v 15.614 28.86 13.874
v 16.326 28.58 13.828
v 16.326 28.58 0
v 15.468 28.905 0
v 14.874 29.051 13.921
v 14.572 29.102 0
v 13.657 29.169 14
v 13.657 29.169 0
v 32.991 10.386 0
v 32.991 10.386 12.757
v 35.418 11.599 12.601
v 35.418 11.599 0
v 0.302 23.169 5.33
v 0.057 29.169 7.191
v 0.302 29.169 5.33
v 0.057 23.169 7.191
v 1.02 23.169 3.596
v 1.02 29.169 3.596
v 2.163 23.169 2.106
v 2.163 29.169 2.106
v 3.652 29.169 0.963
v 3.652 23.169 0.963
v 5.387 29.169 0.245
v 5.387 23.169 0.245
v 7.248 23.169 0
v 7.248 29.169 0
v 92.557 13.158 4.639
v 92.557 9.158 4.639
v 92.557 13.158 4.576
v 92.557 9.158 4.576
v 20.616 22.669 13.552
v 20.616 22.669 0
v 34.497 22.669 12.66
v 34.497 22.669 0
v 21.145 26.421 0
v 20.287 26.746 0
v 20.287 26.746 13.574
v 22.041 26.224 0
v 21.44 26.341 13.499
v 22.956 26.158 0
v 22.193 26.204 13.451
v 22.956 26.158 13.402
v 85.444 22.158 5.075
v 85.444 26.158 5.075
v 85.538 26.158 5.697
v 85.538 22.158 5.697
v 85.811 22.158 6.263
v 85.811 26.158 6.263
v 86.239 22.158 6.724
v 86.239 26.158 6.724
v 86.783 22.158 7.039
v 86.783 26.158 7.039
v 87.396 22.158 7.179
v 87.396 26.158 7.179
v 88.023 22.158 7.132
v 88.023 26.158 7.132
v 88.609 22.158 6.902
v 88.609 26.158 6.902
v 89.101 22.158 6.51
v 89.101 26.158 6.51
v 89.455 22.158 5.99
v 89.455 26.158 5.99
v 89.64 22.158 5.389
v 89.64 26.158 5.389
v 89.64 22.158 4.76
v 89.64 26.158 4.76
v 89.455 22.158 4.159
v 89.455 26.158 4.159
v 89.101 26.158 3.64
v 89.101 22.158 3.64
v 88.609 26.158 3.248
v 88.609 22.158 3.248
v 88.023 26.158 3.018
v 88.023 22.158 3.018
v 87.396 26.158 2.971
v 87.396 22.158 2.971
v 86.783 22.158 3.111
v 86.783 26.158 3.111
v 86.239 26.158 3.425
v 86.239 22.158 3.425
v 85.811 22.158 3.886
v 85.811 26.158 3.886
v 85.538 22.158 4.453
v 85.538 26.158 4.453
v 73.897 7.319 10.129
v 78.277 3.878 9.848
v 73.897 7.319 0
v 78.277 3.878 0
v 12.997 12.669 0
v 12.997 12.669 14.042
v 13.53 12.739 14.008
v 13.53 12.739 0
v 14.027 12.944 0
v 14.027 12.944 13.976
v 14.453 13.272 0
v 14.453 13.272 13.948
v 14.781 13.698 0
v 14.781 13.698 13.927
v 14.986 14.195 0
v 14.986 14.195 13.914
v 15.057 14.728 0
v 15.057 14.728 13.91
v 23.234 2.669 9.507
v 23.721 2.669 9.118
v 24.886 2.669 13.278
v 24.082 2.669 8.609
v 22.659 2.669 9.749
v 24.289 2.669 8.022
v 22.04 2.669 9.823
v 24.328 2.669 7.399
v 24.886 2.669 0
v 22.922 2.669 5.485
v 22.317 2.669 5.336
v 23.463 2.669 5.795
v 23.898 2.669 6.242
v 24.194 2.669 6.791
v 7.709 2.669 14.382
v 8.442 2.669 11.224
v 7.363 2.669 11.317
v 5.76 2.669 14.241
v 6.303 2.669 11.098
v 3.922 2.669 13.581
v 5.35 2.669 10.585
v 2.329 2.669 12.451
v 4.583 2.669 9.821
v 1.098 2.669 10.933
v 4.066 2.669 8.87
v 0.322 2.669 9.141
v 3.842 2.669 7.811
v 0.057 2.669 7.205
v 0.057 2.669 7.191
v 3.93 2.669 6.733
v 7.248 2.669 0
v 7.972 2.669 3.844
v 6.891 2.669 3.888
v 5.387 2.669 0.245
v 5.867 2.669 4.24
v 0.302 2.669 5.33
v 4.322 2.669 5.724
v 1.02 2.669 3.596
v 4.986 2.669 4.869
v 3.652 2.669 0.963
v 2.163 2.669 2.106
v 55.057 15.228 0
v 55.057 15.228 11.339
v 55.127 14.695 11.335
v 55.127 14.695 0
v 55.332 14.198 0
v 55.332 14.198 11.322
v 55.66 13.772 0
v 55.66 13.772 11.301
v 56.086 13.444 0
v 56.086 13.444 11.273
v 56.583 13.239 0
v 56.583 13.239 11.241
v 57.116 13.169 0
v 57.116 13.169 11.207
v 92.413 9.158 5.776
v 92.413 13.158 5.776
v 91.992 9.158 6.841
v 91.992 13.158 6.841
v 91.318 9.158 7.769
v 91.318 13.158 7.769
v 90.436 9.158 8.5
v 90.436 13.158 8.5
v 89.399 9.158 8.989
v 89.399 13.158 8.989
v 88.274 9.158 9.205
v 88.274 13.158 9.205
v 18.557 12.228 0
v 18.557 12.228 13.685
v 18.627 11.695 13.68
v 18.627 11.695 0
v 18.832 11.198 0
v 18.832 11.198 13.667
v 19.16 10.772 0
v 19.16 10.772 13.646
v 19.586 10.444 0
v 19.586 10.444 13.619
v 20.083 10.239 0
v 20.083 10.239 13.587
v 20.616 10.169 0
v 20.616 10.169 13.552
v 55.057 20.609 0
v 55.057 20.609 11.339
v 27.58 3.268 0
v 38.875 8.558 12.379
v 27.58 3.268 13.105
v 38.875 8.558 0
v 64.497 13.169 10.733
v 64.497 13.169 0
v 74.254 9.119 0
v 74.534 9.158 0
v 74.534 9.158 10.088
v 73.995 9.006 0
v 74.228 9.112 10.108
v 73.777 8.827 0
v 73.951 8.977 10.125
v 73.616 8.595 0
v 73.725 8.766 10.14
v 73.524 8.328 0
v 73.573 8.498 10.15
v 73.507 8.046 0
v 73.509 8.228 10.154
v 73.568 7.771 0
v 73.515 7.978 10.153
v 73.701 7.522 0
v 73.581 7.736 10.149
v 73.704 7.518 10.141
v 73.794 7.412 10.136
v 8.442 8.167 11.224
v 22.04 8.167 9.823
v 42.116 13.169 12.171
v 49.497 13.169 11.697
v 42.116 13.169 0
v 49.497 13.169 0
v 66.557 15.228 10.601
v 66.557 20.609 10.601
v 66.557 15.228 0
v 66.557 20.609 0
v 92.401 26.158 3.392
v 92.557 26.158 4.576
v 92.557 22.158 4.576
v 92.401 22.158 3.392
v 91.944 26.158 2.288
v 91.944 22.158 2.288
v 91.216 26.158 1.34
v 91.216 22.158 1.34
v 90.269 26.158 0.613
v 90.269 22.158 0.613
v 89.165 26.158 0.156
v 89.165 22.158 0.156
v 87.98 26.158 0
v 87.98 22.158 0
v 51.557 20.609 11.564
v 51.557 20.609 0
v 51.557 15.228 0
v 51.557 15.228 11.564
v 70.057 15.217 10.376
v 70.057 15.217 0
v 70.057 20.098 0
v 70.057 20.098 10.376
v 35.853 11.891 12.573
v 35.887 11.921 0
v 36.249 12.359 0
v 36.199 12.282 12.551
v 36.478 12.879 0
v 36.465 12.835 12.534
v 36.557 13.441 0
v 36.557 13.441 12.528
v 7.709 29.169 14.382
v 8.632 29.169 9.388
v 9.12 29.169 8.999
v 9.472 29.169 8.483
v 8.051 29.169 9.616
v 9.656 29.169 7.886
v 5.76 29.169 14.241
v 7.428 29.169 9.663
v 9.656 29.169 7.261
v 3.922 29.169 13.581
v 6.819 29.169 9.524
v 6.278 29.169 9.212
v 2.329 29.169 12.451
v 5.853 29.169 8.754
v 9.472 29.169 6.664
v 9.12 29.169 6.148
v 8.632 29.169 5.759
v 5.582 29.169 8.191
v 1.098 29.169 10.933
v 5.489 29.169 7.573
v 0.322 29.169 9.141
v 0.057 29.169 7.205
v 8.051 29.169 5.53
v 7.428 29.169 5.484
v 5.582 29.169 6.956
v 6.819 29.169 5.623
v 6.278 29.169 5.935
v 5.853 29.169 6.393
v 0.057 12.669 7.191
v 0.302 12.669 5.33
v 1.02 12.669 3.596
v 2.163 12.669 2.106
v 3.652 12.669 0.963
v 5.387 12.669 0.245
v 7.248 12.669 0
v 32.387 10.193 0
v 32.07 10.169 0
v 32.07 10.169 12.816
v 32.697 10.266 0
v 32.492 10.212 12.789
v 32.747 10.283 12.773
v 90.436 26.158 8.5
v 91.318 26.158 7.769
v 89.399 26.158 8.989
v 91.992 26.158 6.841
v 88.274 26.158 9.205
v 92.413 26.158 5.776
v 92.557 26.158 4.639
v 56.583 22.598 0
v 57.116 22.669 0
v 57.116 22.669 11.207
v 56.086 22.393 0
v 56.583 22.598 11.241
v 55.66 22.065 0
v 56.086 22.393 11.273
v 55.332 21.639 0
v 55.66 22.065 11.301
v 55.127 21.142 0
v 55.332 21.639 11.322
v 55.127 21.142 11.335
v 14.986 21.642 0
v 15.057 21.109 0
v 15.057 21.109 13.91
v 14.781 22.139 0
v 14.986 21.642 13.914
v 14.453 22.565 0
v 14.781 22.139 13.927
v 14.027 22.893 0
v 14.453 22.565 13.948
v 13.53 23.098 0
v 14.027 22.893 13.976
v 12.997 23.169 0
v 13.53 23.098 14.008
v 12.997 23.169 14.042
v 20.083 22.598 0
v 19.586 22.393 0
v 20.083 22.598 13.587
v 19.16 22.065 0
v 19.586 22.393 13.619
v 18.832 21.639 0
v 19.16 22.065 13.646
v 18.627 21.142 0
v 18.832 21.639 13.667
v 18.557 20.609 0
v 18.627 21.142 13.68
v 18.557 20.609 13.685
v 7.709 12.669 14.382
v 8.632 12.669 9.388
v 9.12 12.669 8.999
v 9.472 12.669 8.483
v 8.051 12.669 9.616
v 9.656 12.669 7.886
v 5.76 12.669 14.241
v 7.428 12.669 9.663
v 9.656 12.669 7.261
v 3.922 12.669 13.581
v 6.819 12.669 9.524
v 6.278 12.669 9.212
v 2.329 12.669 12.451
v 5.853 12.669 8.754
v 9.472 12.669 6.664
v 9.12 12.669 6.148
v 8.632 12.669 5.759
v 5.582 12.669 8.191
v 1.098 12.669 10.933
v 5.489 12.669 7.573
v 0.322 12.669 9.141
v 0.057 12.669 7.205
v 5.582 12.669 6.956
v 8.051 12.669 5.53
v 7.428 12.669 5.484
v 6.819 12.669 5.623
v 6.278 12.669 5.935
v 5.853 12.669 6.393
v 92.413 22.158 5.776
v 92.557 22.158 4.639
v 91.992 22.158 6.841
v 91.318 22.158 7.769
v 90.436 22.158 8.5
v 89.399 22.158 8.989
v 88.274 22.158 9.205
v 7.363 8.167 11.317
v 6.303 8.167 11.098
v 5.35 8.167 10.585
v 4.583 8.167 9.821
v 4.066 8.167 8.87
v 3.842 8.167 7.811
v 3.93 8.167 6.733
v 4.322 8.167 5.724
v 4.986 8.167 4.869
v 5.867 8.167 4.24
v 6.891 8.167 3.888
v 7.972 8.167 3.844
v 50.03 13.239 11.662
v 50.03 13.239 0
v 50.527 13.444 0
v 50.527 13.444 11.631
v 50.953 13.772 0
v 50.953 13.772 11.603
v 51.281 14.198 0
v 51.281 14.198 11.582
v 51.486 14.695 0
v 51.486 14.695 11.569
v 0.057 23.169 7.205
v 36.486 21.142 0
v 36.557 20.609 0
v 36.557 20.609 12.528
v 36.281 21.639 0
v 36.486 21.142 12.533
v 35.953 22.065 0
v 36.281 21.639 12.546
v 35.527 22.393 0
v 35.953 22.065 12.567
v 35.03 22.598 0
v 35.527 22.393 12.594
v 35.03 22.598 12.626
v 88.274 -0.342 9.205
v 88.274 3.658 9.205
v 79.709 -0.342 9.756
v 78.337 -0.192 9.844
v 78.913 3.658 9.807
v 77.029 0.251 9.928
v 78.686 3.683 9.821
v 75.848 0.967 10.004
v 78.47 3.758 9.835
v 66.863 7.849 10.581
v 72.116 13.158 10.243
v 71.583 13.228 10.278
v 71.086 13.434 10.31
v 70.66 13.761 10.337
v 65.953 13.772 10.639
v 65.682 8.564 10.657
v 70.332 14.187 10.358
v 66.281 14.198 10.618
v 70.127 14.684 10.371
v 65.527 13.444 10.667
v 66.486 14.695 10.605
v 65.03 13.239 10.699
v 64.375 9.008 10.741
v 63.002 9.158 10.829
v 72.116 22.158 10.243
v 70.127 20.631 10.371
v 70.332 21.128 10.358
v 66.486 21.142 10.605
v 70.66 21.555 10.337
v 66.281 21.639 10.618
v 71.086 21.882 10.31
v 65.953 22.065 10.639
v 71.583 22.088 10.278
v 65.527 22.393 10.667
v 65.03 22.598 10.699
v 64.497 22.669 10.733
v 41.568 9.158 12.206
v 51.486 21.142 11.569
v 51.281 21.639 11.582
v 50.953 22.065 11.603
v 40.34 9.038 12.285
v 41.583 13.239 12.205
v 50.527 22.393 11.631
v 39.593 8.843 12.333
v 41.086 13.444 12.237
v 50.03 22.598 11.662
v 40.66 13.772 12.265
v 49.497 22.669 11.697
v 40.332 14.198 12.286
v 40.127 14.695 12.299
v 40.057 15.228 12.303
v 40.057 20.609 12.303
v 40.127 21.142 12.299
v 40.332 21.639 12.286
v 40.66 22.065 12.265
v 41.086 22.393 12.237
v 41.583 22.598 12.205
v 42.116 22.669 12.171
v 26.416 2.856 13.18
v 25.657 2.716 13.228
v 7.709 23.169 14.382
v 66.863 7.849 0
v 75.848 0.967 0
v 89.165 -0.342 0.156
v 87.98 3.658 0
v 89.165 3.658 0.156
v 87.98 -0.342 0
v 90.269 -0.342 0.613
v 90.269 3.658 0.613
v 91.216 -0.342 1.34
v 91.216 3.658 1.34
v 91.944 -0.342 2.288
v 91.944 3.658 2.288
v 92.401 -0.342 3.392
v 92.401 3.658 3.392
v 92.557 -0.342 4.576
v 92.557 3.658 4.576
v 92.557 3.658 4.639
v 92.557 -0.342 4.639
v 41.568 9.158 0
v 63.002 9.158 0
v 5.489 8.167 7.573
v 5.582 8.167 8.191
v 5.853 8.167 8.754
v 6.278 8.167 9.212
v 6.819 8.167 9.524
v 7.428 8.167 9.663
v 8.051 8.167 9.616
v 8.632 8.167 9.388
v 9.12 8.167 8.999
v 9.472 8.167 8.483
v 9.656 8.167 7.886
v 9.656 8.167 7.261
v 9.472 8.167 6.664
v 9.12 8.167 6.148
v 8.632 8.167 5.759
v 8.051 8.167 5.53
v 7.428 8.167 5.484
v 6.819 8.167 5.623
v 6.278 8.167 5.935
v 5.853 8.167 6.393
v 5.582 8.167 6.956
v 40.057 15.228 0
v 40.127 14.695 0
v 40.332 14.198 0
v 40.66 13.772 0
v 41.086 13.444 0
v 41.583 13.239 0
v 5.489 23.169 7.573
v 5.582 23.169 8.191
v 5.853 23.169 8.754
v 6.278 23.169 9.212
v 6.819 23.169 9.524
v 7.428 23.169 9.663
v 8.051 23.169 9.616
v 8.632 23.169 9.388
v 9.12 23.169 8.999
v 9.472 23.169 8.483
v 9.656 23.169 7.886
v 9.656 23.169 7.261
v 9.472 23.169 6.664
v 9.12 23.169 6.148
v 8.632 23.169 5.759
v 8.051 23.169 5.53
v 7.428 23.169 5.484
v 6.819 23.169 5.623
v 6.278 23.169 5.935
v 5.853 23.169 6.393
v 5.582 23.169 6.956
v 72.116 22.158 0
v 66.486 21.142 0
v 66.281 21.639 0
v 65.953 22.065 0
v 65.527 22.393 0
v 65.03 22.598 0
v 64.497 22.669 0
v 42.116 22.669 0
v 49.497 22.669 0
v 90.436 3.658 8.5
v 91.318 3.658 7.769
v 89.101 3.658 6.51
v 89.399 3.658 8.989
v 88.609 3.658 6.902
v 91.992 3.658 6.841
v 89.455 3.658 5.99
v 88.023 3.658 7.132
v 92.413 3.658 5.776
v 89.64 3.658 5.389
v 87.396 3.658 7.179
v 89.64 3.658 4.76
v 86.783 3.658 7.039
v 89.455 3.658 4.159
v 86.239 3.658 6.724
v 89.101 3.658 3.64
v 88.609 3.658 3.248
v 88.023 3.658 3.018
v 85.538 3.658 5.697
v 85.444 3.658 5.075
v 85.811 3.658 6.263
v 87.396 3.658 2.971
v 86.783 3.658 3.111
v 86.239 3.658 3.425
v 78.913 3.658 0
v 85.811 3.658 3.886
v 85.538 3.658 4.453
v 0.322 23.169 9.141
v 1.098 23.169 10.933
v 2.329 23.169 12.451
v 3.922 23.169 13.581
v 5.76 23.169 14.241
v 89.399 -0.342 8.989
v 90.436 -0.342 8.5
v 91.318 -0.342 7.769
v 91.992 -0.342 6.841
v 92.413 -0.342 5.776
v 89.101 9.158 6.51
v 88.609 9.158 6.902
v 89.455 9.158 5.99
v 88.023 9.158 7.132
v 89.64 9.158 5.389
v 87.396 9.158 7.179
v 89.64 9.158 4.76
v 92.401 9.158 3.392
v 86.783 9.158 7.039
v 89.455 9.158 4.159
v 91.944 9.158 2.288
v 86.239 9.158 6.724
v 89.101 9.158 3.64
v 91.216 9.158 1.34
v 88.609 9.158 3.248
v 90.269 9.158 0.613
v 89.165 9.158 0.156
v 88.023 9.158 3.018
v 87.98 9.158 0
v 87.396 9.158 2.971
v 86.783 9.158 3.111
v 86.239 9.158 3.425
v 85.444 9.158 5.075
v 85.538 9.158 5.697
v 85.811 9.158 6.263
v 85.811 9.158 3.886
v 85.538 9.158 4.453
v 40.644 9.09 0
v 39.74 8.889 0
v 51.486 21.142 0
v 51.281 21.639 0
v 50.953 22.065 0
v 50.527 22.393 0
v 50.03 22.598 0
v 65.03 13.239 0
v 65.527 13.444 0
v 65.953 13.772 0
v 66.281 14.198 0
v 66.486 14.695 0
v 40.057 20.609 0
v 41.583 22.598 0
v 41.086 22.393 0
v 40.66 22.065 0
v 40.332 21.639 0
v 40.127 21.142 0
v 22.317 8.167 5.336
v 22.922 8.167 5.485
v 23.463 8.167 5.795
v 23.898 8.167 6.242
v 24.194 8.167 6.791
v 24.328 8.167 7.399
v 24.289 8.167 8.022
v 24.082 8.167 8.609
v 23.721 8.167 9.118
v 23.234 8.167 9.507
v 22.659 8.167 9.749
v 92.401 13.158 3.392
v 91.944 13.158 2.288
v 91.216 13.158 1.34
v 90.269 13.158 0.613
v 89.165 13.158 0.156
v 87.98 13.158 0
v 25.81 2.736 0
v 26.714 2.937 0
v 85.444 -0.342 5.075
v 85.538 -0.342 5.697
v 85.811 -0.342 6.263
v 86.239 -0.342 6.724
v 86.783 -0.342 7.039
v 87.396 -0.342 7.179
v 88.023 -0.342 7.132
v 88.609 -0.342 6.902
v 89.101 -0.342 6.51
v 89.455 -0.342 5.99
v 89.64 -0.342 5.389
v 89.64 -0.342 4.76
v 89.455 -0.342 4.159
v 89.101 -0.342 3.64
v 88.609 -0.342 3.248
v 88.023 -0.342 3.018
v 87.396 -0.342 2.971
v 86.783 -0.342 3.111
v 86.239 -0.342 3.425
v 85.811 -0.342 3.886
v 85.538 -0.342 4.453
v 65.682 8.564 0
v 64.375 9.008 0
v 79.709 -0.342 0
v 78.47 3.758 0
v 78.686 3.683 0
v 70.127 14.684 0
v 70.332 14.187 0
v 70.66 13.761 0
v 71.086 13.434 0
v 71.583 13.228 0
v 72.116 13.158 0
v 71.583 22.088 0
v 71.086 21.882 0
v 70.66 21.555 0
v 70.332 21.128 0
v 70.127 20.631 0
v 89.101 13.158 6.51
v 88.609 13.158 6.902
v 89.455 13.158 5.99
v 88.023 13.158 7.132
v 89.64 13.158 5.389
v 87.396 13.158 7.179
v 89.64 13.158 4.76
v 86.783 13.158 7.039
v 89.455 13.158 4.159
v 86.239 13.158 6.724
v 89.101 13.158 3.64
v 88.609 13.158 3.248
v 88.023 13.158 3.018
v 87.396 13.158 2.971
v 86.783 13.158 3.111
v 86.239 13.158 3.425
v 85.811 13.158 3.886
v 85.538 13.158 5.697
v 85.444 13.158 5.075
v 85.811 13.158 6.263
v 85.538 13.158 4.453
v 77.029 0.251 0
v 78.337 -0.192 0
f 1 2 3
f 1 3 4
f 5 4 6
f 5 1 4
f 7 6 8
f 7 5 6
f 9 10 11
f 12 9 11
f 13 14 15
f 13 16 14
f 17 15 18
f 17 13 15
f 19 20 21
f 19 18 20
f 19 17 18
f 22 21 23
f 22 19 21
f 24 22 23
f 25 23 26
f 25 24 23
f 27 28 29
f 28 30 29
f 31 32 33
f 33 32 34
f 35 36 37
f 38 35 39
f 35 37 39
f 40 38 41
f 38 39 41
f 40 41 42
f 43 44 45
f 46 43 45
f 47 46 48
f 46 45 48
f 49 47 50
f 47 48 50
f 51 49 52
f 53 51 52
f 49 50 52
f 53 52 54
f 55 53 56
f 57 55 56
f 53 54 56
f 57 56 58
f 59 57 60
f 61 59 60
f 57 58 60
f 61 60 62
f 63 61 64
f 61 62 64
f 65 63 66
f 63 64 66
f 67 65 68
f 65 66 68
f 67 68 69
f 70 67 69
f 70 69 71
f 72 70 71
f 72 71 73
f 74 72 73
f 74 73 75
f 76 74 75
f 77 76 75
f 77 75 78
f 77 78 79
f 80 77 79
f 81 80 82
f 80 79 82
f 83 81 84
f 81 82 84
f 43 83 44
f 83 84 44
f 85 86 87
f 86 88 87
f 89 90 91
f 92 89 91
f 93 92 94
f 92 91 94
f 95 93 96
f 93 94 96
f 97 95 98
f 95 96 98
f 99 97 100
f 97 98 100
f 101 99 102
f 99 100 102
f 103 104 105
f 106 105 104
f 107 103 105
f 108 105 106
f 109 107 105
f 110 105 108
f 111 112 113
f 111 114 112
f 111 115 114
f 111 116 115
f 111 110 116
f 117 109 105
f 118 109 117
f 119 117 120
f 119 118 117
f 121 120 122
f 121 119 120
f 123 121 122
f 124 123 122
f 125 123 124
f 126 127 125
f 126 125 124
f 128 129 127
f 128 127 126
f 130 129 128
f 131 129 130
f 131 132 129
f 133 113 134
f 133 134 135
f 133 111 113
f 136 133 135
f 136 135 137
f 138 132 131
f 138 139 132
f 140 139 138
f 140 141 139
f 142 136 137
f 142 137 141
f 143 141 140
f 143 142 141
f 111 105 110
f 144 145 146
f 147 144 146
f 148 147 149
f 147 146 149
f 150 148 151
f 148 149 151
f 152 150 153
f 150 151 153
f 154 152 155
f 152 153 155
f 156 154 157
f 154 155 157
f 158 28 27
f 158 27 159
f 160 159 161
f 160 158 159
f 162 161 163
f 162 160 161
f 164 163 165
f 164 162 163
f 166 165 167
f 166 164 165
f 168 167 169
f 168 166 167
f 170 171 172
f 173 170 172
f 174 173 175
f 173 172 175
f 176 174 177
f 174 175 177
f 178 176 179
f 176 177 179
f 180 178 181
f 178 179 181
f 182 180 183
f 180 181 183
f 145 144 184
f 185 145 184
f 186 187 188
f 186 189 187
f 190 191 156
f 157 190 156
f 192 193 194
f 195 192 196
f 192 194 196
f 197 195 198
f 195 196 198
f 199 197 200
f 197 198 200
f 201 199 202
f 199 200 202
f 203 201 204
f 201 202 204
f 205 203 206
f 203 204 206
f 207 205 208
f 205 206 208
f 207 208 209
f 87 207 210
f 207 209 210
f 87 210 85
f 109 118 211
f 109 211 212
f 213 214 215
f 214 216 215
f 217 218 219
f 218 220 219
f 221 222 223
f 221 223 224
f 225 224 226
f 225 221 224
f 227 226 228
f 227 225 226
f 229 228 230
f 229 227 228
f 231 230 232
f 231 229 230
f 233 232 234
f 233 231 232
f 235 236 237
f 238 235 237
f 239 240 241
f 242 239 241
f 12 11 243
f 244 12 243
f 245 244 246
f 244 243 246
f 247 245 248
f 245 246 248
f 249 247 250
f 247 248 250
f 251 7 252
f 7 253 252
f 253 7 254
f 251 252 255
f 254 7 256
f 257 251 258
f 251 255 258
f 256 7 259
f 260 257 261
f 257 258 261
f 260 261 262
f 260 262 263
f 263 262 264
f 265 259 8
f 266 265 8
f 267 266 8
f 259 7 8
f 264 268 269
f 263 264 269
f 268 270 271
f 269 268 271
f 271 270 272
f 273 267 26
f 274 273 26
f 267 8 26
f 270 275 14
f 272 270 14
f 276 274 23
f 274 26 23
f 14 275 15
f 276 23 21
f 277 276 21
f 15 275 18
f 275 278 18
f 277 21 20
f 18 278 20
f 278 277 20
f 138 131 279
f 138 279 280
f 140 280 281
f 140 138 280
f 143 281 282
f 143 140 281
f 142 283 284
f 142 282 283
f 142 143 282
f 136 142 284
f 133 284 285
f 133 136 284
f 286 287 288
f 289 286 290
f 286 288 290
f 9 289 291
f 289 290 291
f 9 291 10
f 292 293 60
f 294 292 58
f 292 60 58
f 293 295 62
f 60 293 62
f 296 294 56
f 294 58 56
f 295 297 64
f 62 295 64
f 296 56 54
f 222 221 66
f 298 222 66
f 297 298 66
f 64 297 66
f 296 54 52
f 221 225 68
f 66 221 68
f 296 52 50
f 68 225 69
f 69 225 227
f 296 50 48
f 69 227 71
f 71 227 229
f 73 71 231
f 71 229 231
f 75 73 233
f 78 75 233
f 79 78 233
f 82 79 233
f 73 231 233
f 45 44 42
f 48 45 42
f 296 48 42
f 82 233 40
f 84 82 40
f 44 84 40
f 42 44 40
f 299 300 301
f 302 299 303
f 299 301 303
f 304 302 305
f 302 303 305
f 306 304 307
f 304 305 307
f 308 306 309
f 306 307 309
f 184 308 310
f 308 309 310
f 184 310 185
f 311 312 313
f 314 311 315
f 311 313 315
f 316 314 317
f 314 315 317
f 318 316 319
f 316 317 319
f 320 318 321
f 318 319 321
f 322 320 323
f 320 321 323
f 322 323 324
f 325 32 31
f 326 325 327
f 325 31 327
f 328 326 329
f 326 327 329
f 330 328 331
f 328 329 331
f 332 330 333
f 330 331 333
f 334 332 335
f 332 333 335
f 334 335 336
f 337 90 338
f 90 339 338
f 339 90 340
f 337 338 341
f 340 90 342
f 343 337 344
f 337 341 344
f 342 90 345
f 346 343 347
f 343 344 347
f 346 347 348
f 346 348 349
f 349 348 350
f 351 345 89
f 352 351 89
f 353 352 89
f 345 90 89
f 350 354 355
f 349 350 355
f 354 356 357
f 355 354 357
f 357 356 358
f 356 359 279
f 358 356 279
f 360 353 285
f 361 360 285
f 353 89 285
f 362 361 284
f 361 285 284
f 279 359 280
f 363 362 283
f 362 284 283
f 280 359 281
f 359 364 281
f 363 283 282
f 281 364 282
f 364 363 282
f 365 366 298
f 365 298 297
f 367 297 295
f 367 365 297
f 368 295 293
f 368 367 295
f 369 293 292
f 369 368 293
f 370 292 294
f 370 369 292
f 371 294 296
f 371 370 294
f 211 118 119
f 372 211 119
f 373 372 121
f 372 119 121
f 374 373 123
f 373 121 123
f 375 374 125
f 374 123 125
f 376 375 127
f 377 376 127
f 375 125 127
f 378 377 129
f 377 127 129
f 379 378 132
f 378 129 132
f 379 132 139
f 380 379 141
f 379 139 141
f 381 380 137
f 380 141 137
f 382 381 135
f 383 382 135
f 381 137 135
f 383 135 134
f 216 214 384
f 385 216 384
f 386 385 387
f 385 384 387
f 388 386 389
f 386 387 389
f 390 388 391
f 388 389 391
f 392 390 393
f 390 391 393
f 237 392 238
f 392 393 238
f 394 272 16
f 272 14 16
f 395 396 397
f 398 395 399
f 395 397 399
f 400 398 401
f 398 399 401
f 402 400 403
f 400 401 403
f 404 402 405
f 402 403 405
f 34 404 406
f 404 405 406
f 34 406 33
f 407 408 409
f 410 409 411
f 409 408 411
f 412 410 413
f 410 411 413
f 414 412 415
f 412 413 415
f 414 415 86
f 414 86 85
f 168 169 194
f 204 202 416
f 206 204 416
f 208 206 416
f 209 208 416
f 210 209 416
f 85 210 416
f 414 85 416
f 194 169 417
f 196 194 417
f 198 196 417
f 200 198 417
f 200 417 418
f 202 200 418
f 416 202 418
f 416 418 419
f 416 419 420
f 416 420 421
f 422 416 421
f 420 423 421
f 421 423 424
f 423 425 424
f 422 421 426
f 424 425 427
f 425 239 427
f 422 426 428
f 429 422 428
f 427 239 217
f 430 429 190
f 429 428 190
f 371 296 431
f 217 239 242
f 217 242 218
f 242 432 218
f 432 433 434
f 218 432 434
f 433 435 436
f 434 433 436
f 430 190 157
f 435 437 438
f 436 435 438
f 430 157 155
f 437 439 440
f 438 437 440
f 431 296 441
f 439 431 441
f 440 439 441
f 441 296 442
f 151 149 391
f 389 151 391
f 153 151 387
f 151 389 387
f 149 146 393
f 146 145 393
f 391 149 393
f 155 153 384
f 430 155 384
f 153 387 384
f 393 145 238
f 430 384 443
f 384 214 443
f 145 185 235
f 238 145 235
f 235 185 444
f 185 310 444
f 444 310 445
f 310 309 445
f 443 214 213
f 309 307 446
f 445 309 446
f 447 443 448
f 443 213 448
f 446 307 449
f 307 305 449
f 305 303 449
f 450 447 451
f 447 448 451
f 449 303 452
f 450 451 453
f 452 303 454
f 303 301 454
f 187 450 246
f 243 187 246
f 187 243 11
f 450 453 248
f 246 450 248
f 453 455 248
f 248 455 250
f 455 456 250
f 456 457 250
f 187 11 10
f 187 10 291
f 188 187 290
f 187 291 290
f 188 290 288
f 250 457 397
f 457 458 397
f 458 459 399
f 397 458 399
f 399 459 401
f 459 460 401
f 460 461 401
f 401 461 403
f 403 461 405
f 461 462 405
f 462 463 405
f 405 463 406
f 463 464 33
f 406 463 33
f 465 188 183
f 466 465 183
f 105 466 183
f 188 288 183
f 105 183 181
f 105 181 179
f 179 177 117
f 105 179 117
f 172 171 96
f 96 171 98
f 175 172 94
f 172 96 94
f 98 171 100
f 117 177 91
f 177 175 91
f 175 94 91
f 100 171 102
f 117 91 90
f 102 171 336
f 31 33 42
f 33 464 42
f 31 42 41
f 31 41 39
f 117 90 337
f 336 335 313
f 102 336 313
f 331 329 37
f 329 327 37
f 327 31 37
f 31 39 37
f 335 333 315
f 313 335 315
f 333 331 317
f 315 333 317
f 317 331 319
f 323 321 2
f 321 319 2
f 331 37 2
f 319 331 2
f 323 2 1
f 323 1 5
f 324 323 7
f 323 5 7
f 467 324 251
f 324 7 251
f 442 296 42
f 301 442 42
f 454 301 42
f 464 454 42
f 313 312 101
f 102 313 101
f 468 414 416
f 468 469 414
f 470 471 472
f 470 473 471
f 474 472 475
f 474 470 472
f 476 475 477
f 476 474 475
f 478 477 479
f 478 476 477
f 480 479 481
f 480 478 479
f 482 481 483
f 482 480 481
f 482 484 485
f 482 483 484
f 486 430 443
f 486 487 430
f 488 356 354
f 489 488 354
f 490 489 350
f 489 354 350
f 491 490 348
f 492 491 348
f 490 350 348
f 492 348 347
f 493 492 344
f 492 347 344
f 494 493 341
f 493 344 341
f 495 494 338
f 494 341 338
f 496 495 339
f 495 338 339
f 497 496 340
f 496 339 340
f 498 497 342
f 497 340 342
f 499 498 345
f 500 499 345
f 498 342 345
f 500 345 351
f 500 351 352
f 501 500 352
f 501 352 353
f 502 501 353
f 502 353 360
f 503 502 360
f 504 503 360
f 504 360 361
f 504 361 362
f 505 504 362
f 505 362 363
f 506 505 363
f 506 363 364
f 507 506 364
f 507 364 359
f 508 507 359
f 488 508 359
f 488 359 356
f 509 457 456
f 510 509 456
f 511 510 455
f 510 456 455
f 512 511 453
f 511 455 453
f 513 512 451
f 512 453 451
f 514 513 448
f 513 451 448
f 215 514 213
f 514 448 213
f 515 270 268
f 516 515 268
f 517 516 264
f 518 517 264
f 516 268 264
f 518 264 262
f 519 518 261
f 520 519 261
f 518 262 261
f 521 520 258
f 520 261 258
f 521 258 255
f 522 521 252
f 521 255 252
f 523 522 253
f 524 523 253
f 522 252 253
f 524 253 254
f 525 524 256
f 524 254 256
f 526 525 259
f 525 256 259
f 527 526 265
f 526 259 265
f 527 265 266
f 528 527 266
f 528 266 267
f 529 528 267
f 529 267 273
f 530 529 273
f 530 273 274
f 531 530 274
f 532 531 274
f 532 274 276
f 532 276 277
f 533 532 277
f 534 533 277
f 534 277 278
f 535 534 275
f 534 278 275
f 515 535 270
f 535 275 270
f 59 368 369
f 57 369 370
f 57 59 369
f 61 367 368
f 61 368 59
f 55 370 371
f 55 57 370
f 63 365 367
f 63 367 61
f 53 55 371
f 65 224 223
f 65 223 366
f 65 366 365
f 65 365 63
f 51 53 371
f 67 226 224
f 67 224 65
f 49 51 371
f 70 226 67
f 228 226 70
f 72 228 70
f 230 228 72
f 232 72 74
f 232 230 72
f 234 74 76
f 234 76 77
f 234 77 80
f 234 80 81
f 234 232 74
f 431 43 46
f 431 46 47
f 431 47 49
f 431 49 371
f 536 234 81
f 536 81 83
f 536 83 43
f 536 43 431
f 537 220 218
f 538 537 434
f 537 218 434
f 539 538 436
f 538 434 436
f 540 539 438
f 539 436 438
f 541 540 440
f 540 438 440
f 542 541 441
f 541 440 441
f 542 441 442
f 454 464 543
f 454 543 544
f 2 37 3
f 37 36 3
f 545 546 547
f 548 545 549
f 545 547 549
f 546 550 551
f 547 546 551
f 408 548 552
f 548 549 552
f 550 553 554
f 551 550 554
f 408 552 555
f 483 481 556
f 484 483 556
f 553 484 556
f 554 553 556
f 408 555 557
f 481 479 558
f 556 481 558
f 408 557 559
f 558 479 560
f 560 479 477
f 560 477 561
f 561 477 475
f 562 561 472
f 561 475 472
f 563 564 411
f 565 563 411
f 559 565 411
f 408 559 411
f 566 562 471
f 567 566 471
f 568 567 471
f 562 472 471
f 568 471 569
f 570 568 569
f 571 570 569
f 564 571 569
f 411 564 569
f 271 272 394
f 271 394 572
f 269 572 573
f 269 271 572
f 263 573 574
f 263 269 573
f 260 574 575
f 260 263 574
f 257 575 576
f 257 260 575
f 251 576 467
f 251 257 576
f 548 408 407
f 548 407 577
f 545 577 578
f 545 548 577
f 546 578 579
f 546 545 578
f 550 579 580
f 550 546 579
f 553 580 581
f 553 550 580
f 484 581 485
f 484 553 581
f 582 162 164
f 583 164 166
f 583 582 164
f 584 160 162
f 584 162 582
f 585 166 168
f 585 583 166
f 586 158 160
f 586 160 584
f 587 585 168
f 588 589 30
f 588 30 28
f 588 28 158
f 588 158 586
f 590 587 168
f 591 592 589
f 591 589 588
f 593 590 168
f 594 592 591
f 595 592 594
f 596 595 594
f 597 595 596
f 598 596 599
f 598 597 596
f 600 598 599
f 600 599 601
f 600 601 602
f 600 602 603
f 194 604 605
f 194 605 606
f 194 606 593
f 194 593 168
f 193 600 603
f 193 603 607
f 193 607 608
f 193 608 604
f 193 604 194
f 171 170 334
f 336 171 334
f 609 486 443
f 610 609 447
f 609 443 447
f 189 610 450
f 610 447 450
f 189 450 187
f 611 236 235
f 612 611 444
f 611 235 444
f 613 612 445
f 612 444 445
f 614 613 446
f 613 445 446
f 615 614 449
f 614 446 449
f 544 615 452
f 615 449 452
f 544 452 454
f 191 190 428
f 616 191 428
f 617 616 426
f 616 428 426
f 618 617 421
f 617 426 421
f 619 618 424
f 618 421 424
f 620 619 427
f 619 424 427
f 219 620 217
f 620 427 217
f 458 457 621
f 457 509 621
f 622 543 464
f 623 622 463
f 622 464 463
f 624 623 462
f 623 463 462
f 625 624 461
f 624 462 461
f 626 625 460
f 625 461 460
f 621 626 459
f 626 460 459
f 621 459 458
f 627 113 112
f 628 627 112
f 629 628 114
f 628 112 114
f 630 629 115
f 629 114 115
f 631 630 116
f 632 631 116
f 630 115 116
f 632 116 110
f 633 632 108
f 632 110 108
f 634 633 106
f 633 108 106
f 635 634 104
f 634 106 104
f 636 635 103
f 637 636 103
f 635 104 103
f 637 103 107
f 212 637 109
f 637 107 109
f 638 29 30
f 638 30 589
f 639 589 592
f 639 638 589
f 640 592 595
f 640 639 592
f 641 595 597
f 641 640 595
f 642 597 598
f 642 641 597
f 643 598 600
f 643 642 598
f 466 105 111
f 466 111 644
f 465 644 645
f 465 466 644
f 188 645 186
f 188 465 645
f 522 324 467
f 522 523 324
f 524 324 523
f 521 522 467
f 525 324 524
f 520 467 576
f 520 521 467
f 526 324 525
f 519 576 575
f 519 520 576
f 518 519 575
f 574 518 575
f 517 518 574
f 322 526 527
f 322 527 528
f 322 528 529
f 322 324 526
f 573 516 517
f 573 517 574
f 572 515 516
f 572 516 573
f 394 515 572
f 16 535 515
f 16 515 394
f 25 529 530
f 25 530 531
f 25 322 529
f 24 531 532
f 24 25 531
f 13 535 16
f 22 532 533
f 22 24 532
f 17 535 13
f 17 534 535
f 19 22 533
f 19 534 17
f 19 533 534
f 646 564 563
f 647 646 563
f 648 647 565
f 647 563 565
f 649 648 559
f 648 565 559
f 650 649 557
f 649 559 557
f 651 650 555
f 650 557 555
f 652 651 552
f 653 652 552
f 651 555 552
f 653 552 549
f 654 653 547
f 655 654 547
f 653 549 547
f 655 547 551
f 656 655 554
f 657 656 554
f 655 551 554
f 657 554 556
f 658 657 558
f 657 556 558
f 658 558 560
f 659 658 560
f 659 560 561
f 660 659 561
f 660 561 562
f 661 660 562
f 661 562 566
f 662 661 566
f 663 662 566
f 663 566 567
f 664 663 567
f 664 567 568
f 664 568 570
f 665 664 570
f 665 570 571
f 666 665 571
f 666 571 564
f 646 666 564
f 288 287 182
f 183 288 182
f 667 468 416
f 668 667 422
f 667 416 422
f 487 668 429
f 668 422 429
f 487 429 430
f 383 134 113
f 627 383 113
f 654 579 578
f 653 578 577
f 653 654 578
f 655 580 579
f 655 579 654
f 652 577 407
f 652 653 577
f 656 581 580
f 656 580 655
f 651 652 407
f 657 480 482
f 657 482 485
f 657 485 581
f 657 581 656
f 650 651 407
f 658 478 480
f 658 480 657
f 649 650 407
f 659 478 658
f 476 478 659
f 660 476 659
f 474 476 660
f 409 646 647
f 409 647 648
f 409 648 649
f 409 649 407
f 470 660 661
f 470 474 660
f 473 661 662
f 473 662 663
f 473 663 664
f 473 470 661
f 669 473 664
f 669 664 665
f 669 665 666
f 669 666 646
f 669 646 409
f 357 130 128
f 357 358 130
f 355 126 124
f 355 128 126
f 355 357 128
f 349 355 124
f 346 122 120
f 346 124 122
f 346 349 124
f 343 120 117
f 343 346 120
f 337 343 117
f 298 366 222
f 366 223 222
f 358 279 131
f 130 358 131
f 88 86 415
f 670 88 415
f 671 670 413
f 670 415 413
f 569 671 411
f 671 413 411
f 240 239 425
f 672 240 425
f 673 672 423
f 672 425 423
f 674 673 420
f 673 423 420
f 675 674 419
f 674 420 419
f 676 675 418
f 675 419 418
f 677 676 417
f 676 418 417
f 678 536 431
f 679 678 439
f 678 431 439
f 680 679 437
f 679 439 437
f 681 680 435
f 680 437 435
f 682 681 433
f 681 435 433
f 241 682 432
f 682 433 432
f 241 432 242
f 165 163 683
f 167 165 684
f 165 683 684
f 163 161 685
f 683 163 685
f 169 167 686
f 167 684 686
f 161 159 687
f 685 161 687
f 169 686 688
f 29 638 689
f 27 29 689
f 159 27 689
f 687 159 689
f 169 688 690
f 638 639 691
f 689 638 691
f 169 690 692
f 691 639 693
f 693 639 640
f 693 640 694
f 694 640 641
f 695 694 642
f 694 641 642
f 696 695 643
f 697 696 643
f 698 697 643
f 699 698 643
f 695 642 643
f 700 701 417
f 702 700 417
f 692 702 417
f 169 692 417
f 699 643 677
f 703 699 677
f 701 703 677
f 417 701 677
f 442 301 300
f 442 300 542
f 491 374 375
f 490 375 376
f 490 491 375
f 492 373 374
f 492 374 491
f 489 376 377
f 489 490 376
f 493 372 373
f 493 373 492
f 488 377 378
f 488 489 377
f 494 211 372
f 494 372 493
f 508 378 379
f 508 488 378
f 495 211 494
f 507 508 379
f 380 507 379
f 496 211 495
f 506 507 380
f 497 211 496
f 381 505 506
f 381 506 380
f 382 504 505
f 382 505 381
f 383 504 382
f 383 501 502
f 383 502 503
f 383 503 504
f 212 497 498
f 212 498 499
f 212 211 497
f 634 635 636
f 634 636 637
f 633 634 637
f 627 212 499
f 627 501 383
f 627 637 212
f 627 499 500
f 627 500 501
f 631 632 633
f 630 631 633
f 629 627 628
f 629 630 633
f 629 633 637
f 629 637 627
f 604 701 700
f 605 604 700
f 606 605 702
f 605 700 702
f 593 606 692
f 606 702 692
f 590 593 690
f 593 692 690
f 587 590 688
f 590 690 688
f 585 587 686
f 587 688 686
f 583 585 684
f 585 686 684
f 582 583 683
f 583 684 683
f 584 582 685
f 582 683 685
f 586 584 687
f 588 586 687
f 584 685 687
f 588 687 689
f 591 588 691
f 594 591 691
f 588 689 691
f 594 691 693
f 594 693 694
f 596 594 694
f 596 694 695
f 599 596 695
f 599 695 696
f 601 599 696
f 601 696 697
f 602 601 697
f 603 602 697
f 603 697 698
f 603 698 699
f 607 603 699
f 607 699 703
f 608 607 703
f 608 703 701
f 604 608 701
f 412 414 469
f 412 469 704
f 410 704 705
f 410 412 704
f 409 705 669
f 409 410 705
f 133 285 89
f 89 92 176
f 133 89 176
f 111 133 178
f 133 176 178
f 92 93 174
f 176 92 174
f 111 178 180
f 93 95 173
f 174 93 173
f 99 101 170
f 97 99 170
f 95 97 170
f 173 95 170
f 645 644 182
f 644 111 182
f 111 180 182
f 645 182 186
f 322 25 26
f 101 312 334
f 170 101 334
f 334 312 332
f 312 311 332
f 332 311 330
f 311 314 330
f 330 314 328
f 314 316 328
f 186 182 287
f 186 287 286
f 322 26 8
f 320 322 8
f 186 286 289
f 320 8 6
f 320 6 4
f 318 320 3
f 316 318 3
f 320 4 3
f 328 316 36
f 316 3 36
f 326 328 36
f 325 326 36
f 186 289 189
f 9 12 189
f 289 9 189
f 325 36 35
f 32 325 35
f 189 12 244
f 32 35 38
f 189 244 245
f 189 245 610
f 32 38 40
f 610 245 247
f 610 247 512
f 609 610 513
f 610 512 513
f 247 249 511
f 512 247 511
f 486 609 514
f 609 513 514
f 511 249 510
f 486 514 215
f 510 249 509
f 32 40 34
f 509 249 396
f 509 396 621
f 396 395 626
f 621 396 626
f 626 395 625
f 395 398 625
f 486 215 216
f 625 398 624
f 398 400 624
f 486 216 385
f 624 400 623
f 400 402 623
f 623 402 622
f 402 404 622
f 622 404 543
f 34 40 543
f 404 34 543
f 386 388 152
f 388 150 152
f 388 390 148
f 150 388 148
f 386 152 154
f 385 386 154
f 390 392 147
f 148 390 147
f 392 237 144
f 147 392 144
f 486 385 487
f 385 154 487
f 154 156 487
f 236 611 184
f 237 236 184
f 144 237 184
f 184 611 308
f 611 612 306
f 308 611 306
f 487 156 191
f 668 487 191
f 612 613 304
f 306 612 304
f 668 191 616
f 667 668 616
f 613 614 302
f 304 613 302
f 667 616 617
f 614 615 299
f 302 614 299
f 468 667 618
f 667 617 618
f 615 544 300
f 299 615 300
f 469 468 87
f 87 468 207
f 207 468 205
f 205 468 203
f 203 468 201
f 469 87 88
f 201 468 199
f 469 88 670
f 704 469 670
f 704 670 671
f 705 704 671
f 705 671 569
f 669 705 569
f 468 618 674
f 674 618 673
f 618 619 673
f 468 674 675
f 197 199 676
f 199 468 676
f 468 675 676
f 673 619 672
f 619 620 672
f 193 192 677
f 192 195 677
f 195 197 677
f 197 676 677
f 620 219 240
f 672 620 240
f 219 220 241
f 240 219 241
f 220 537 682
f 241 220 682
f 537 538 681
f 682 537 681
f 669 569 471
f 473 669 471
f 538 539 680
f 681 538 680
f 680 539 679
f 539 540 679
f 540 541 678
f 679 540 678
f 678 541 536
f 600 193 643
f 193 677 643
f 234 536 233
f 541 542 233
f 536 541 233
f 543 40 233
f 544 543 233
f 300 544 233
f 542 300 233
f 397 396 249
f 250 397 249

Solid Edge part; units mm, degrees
sketch "Sketch1" plane through (0, 0, 0) normal (0, 0, -1) x (-1, 0, 0)
  line L0 (-66.5566, 13.1686) -> (-55.0566, 13.1686)
  line L1 (-55.0566, 13.1686) -> (-55.0566, 22.6686)
  line L2 (-55.0566, 22.6686) -> (-66.5566, 22.6686)
  line L3 (-66.5566, 22.6686) -> (-66.5566, 13.1686)
  line L4 (-51.5566, 13.1686) -> (-40.0566, 13.1686)
  line L5 (-40.0566, 13.1686) -> (-40.0566, 22.6686)
  line L6 (-40.0566, 22.6686) -> (-51.5566, 22.6686)
  line L7 (-51.5566, 22.6686) -> (-51.5566, 13.1686)
  line L8 (-32.5566, 10.1686) -> (-18.5566, 10.1686)
  line L9 (-18.5566, 10.1686) -> (-18.5566, 22.6686)
  line L10 (-18.5566, 22.6686) -> (-36.5566, 22.6686)
  line L11 (-36.5566, 22.6686) -> (-36.5566, 12.1686)
  line L12 (-32.5566, 10.1686) -> (-36.5566, 12.1686)
  line L13 (-92.5566, 26.1578) -> (-21.5566, 26.1578)
  line L14 (-21.5566, 26.1578) -> (-15.0566, 29.1686)
  line L15 (-15.0566, 29.1686) -> (-0.0566, 29.1686)
  line L16 (-0.0566, 29.1686) -> (-0.0566, 23.1686)
  line L17 (-15.0566, 23.1686) -> (-0.0566, 23.1686)
  line L18 (-15.0566, 23.1686) -> (-15.0566, 12.6686)
  line L19 (-15.0566, 12.6686) -> (-0.0566, 12.6686)
  line L20 (-0.0566, 12.6686) -> (-0.0566, 2.6686)
  line L21 (-26.2997, 2.6686) -> (-0.0566, 2.6686)
  line L22 (-40.1546, 9.1578) -> (-26.2997, 2.6686)
  line L23 (-65.1546, 9.1578) -> (-40.1546, 9.1578)
  line L24 (-77.5566, -0.3422) -> (-65.1546, 9.1578)
  line L25 (-92.5566, -0.3422) -> (-77.5566, -0.3422)
  line L26 (-92.5566, 3.6578) -> (-92.5566, -0.3422)
  line L27 (-92.5566, 3.6578) -> (-78.5566, 3.6578)
  line L28 (-78.5566, 3.6578) -> (-71.5566, 9.1578)
  line L29 (-92.5566, 9.1578) -> (-71.5566, 9.1578)
  line L30 (-92.5566, 9.1578) -> (-92.5566, 13.1578)
  line L31 (-92.5566, 13.1578) -> (-70.0566, 13.1578)
  line L32 (-70.0566, 13.1578) -> (-70.0566, 22.1578)
  line L33 (-92.5566, 22.1578) -> (-70.0566, 22.1578)
  line L34 (-92.5566, 22.1578) -> (-92.5566, 26.1578)
  dimension "D1" = 10
  dimension "D2" = 15
  dimension "D3" = 10.5
  dimension "D4" = 6
  dimension "D5" = 4
  dimension "D6" = 9.5
  dimension "D7" = 11.5
  dimension "D8" = 9
  dimension "D9" = 5.5
  dimension "D10" = 15
  dimension "D11" = 21
  dimension "D12" = 22.5
  dimension "D13" = 15.2993
  dimension "D14" = 14
  dimension "D15" = 12.5
  dimension "D16" = 18
  dimension "D17" = 10.5
  dimension "D18" = 4.4721
  dimension "D19" = 3.5
  dimension "D20" = 3.5
  dimension "D21" = 3.5
  dimension "D22" = 3.5
  dimension "D23" = 92.5
  dimension "D24" = 71
  dimension "D25" = 15
  dimension "D26" = 6.5
  dimension "D27" = 26.2431
  dimension "D28" = 25
  dimension "D29" = 14
  dimension "D30" = 17
  dimension "D31" = 4
  dimension "D32" = 15.6224
extrude "Protrusion1" add sketch "Sketch1" against normal blind 15.0368
sketch "Sketch2" plane through (13.1782, 2.6686, 7.5184) normal (0, -1, 0) x (1, 0, 0)
  line L0 (74.2537, 1.7409) -> (1.8784, 6.3912)
extrude "Enlèvement_matière_1" cut sketch "Sketch2" along normal mid plane 64.6684 material side at (51.2475, 2.6686, 11.6343)
sketch "Sketch3" plane through (7.6241, 29.1686, 7.4367) normal (0, 1, 0) x (-1, 0, 0)
  circle A0 centre (0.0398, 0.1367) radius 2.0955
  circle A1 centre (-79.9299, -2.362) radius 2.1098
extrude "Enlèvement_matière_3" cut sketch "Sketch3" along normal mid plane 246.888
fillet "Congé_1" radius 7.1911 4 edges at (0.0566, 26.1686, 14.8734) (0.0566, 7.6686, 14.8734) (0.0566, 26.1686, 0) (0.0566, 7.6686, 0)
fillet "Congé_2" radius 4.5761 6 edges at (92.5566, 1.6578, 8.93) (92.5566, 11.1578, 8.93) (92.5566, 24.1578, 8.93) (92.5566, 24.1578, 0) (92.5566, 11.1578, 0) (92.5566, 1.6578, 0)
fillet "Congé_3" radius 2.0593 15 edges at (15.0566, 23.1686, 6.9548) (15.0566, 12.6686, 6.9548) (36.5566, 22.6686, 6.2641) (36.5566, 12.1686, 6.2641) (32.5566, 10.1686, 6.3926) (18.5566, 10.1686, 6.8424) (18.5566, 22.6686, 6.8424) (40.0566, 13.1686, 6.1516) (40.0566, 22.6686, 6.1516) (51.5566, 22.6686, 5.7822) (55.0566, 13.1686, 5.6697) (51.5566, 13.1686, 5.7822) (55.0566, 22.6686, 5.6697) (66.5566, 22.6686, 5.3003) (66.5566, 13.1686, 5.3003)
fillet "Congé_5" radius 2.0593 2 edges at (70.0566, 13.1578, 5.1878) (70.0566, 22.1578, 5.1878)
fillet "Congé_6" radius 1.0296 2 edges at (71.5566, 9.1578, 5.1397) (78.5566, 3.6578, 4.9148)
fillet "Congé_7" radius 6.35 1 edges at (77.5566, -0.3422, 4.9469)
fillet "Congé_8" radius 6.35 5 edges at (40.1546, 9.1578, 6.1485) (65.1546, 9.1578, 5.3453) (26.2997, 2.6686, 6.5936) (15.0566, 29.1686, 6.9548) (21.5566, 26.1578, 6.746)
sketch "Sketch4" plane through (12.4715, 2.6686, 7.1983) normal (0, -1, 0) x (1, 0, 0)
  line L0 (-4.4993, -3.3547) -> (9.8456, -1.8628)
  line L1 (-4.03, 4.0259) -> (9.569, 2.6247)
  arc A0 (-4.03, 4.0259) -> (-4.4993, -3.3547) centre (-4.8872, 0.3752) ccw
  arc A1 (9.8456, -1.8628) -> (9.569, 2.6247) centre (9.6128, 0.3752) ccw
extrude "Enlèvement_matière_4" cut sketch "Sketch4" against normal blind 5.498
properties part number "AC_1.04"
